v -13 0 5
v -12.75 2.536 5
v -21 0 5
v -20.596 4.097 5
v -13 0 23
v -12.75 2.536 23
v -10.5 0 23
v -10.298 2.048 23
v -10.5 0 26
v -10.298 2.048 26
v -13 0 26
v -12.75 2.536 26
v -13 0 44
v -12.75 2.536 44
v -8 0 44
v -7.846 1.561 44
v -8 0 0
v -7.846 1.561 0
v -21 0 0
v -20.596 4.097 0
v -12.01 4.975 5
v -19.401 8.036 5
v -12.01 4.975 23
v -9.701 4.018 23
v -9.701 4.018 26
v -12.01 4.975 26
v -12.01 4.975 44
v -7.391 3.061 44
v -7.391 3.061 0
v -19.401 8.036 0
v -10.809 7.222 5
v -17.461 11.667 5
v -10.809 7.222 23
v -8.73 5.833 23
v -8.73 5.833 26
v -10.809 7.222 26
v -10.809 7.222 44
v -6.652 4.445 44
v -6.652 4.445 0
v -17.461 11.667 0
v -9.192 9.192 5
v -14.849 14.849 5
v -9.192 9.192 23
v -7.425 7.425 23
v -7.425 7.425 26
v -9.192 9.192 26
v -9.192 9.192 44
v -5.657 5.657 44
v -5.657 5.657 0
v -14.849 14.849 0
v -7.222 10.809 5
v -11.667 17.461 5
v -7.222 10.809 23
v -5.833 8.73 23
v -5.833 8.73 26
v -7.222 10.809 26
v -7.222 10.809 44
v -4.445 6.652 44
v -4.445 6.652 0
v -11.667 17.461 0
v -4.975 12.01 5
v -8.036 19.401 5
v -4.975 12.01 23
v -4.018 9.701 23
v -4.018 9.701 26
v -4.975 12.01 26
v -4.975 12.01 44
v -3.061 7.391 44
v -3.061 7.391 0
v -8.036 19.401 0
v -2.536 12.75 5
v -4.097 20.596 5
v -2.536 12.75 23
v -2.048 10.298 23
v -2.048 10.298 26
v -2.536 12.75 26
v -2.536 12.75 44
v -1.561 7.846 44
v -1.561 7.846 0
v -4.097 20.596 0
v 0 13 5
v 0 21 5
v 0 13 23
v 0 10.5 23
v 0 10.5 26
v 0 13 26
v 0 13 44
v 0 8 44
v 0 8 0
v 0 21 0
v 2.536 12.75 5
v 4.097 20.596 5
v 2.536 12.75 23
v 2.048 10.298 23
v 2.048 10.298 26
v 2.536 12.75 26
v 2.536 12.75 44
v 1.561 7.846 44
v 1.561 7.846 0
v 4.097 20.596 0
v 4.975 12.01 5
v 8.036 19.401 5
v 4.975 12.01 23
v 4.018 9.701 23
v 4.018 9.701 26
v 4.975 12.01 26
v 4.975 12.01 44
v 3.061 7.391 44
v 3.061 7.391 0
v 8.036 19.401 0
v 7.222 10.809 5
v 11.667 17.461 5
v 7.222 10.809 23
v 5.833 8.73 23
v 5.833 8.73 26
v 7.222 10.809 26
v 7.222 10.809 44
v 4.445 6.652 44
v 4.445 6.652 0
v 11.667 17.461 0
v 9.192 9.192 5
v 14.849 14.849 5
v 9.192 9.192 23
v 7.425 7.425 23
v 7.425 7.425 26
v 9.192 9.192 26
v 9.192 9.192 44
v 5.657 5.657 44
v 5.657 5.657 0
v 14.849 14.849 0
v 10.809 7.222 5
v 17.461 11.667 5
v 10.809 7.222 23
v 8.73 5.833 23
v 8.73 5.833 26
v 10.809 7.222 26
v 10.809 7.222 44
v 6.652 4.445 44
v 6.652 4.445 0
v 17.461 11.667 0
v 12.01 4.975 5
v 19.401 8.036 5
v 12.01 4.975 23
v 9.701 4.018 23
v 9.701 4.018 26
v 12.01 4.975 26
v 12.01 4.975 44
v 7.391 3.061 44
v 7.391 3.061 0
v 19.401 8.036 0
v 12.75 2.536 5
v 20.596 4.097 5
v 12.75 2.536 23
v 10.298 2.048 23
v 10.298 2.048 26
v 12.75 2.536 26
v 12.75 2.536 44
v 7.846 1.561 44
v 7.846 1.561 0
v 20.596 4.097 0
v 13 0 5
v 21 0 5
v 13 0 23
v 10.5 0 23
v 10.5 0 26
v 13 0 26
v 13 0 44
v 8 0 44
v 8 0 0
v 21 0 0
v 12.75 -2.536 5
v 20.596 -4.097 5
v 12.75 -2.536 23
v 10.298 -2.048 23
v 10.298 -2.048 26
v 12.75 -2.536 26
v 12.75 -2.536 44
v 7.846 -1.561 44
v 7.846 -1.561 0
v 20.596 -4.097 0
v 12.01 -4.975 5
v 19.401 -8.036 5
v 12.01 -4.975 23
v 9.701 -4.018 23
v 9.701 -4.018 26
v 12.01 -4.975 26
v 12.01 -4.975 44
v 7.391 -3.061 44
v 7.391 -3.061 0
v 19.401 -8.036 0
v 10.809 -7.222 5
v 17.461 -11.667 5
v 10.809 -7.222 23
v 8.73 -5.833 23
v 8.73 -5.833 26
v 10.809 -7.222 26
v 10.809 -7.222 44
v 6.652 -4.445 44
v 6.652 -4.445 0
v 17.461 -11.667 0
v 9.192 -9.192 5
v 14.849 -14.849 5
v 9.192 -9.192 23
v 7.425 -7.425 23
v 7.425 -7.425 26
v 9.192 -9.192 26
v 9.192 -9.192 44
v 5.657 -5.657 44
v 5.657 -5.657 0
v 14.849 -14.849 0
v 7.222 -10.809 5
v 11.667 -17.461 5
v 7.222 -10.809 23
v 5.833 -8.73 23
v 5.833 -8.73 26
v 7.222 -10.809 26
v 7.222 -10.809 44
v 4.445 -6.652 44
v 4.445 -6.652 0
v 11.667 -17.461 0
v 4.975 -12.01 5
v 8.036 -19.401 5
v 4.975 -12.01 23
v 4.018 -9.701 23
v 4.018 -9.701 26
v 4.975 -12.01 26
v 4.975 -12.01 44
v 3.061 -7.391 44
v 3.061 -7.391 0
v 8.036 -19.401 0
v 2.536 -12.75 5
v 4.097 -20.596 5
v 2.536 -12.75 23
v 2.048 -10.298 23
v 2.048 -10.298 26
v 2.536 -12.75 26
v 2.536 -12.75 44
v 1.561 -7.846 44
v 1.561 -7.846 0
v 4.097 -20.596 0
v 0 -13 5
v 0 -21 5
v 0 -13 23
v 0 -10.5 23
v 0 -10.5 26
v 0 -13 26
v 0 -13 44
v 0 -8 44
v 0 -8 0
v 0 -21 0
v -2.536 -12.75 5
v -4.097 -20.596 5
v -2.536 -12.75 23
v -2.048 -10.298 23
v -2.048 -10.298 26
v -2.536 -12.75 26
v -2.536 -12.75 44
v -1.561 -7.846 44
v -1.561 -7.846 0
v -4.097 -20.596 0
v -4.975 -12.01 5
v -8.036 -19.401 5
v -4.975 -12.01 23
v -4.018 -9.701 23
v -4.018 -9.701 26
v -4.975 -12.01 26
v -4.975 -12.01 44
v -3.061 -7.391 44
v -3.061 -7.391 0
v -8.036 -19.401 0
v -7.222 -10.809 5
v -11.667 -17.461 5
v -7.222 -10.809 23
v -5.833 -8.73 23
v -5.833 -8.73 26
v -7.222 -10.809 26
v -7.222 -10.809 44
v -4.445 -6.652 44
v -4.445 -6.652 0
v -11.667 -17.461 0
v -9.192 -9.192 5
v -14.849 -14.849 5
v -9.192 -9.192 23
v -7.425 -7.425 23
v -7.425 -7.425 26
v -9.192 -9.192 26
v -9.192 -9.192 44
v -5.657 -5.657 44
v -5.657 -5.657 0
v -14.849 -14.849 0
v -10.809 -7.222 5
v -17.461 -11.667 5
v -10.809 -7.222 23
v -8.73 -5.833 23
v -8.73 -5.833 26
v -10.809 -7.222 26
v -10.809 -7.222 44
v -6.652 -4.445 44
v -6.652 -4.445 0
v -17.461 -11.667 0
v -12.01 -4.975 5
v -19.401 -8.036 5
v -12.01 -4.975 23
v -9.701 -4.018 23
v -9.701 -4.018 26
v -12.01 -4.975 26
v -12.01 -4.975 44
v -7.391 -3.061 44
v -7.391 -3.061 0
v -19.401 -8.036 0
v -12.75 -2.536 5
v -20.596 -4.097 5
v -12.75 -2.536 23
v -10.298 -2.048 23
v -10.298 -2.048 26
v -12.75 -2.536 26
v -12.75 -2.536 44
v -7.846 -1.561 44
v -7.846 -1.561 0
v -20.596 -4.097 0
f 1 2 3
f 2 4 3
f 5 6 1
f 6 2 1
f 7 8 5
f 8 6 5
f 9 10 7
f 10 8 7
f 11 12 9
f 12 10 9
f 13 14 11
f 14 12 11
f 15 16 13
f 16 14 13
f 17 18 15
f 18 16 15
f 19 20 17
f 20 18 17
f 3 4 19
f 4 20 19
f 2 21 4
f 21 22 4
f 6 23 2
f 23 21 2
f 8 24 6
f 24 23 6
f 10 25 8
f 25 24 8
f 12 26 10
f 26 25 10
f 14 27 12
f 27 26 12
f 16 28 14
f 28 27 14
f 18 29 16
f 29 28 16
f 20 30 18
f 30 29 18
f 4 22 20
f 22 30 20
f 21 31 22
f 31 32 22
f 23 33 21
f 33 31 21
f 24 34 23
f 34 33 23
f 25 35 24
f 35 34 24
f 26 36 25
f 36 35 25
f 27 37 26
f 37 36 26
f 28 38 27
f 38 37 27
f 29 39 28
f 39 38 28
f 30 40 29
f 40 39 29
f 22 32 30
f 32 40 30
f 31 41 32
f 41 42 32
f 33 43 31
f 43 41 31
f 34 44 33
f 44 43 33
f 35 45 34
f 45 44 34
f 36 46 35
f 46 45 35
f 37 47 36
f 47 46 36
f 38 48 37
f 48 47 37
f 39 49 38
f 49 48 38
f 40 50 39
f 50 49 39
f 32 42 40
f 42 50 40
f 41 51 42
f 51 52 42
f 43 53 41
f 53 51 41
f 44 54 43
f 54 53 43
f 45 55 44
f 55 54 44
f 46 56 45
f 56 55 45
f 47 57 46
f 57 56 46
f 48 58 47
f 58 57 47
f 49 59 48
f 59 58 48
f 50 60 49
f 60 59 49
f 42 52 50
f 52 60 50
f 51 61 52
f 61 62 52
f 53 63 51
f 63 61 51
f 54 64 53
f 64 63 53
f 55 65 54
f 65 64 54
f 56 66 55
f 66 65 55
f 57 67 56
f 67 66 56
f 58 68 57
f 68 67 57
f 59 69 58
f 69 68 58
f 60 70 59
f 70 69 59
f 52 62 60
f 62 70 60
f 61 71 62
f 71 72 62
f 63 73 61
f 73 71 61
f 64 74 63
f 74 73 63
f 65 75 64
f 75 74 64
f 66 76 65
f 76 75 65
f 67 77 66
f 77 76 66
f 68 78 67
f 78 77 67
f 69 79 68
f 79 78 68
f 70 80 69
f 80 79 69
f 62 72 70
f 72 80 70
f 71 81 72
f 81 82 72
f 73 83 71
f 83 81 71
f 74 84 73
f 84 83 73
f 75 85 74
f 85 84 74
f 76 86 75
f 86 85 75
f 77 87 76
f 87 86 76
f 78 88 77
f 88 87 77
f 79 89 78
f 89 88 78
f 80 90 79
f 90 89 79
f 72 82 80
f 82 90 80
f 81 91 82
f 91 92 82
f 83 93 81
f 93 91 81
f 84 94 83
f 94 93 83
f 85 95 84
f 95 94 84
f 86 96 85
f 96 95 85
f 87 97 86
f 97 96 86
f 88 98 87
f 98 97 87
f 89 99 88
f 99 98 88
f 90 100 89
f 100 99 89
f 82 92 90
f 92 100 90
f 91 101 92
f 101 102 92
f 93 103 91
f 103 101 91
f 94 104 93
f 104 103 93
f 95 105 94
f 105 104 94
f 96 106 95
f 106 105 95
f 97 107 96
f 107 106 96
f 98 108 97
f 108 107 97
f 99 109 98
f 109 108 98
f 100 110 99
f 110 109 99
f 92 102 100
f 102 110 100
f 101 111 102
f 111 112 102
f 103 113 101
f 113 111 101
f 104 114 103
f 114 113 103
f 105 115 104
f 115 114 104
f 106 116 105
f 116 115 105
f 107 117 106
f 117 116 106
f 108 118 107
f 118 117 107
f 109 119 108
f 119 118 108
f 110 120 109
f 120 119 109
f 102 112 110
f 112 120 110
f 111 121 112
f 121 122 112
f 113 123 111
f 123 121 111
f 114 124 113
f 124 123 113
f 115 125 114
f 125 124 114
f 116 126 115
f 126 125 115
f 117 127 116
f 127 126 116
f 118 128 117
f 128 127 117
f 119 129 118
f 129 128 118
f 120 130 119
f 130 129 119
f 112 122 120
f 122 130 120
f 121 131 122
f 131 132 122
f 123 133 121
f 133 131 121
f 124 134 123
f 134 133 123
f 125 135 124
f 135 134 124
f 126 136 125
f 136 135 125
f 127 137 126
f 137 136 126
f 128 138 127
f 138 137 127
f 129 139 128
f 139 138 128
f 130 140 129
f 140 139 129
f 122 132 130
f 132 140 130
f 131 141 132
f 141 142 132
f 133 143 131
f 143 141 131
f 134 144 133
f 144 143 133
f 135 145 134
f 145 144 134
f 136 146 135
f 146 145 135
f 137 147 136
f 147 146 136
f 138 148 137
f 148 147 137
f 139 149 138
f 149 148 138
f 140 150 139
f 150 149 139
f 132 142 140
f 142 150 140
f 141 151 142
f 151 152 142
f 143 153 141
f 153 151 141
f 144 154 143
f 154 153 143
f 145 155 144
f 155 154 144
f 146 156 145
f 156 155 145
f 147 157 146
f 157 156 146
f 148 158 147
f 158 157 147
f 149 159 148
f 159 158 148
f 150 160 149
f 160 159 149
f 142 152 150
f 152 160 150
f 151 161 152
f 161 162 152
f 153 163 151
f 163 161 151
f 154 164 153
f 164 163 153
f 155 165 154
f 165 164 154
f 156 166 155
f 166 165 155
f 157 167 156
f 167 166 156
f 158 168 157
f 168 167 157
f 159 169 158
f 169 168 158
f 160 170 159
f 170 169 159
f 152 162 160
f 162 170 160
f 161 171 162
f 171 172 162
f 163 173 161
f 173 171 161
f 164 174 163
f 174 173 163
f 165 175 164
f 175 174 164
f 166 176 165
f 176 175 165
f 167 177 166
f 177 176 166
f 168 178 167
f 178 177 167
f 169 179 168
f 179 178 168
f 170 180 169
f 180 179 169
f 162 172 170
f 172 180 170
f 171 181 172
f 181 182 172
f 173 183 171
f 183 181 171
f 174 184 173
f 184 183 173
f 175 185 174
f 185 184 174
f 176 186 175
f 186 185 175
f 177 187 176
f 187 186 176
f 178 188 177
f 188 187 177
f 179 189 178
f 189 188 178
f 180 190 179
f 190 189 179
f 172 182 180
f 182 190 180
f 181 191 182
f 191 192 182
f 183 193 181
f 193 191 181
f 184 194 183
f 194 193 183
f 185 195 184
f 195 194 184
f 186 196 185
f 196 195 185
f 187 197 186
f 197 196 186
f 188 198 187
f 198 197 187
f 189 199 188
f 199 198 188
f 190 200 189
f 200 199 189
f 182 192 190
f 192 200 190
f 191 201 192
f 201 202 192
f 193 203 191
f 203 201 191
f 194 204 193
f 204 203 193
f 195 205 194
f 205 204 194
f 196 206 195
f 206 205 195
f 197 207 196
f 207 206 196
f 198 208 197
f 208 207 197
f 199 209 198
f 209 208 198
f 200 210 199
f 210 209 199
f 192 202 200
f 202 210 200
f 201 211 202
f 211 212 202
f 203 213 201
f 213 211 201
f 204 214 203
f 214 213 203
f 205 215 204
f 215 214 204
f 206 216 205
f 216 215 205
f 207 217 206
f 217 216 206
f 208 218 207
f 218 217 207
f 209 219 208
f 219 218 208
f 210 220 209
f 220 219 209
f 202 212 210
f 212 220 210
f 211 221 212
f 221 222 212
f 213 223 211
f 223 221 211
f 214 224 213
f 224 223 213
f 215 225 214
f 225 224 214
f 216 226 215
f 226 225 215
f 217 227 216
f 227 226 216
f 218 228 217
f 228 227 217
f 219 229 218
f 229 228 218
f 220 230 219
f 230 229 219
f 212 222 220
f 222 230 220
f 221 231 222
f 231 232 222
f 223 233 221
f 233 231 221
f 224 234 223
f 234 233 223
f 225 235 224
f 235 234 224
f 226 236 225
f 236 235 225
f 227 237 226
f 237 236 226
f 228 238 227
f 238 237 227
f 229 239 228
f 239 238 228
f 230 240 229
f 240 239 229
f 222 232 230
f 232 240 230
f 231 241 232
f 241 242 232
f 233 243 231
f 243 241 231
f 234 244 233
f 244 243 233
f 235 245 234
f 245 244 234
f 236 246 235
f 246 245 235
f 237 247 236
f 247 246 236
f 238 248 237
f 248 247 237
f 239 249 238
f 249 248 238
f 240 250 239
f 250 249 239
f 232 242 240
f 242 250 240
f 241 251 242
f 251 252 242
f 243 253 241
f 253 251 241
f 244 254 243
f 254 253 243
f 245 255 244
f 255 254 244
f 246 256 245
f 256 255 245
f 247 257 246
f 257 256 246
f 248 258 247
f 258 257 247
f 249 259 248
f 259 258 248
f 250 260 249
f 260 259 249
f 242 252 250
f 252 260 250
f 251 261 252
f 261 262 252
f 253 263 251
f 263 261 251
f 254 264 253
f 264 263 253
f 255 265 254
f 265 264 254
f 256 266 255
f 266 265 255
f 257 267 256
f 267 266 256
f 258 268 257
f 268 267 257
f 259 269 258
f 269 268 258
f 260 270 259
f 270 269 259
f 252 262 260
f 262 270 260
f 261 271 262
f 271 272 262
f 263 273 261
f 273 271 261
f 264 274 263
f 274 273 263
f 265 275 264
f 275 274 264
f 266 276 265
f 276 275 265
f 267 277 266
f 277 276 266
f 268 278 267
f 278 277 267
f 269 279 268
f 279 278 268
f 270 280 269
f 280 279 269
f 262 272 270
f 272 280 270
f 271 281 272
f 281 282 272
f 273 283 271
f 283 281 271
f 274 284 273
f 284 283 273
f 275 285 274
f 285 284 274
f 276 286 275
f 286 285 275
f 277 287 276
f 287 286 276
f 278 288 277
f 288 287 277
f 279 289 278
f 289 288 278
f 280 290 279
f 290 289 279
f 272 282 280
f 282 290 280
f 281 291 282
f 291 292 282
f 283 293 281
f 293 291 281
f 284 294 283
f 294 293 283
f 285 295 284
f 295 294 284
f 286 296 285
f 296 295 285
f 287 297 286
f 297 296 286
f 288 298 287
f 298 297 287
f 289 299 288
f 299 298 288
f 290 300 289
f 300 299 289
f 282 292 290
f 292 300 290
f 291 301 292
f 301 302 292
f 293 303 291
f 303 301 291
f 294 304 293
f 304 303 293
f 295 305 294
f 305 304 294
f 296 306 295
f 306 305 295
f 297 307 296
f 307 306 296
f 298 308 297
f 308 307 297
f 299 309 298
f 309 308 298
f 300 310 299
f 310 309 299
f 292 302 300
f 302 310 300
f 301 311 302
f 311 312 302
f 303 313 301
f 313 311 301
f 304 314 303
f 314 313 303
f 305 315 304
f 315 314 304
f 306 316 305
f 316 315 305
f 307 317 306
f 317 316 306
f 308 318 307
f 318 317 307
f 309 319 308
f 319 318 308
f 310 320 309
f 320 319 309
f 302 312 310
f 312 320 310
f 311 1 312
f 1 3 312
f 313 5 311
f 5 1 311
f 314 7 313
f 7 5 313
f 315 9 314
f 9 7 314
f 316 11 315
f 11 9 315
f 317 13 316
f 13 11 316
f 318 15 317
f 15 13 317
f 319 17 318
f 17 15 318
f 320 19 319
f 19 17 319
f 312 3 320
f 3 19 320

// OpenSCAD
$fn = 32;

// ----------------------------------------------------------------------
// Grooved revolve: flanged, bore R8
// ----------------------------------------------------------------------

// --- parameters (mm) ---
bore_r = 8;               // bore radius
outer_r = 13;             // outer radius of the body
total_h = 44;             // overall height, Z
wall = 5;                 // radial wall thickness
groove_w = 3;             // groove width
groove_d = 2.5;           // groove depth
grooves = 1;              // number of outer grooves
flange_r = 21;            // flange radius
flange_h = 5;             // flange height

bbox_x = 2 * flange_r;  // full diameter
bore_d = 2 * bore_r;  // bore diameter
body_d = 2 * outer_r;  // body diameter
flange_d = 2 * flange_r;  // flange diameter
revolve_angle = 360;  // full turn around the Z axis

profile = [[8, 0], [13, 0], [21, 0], [21, 5], [13, 5], [13, 23], [10.5, 23], [10.5, 26], [13, 26], [13, 44], [8, 44]];  // primary outline, 11 points, counter clockwise

// --- the one profile operation ---
rotate_extrude(angle = revolve_angle) polygon(points = profile);
